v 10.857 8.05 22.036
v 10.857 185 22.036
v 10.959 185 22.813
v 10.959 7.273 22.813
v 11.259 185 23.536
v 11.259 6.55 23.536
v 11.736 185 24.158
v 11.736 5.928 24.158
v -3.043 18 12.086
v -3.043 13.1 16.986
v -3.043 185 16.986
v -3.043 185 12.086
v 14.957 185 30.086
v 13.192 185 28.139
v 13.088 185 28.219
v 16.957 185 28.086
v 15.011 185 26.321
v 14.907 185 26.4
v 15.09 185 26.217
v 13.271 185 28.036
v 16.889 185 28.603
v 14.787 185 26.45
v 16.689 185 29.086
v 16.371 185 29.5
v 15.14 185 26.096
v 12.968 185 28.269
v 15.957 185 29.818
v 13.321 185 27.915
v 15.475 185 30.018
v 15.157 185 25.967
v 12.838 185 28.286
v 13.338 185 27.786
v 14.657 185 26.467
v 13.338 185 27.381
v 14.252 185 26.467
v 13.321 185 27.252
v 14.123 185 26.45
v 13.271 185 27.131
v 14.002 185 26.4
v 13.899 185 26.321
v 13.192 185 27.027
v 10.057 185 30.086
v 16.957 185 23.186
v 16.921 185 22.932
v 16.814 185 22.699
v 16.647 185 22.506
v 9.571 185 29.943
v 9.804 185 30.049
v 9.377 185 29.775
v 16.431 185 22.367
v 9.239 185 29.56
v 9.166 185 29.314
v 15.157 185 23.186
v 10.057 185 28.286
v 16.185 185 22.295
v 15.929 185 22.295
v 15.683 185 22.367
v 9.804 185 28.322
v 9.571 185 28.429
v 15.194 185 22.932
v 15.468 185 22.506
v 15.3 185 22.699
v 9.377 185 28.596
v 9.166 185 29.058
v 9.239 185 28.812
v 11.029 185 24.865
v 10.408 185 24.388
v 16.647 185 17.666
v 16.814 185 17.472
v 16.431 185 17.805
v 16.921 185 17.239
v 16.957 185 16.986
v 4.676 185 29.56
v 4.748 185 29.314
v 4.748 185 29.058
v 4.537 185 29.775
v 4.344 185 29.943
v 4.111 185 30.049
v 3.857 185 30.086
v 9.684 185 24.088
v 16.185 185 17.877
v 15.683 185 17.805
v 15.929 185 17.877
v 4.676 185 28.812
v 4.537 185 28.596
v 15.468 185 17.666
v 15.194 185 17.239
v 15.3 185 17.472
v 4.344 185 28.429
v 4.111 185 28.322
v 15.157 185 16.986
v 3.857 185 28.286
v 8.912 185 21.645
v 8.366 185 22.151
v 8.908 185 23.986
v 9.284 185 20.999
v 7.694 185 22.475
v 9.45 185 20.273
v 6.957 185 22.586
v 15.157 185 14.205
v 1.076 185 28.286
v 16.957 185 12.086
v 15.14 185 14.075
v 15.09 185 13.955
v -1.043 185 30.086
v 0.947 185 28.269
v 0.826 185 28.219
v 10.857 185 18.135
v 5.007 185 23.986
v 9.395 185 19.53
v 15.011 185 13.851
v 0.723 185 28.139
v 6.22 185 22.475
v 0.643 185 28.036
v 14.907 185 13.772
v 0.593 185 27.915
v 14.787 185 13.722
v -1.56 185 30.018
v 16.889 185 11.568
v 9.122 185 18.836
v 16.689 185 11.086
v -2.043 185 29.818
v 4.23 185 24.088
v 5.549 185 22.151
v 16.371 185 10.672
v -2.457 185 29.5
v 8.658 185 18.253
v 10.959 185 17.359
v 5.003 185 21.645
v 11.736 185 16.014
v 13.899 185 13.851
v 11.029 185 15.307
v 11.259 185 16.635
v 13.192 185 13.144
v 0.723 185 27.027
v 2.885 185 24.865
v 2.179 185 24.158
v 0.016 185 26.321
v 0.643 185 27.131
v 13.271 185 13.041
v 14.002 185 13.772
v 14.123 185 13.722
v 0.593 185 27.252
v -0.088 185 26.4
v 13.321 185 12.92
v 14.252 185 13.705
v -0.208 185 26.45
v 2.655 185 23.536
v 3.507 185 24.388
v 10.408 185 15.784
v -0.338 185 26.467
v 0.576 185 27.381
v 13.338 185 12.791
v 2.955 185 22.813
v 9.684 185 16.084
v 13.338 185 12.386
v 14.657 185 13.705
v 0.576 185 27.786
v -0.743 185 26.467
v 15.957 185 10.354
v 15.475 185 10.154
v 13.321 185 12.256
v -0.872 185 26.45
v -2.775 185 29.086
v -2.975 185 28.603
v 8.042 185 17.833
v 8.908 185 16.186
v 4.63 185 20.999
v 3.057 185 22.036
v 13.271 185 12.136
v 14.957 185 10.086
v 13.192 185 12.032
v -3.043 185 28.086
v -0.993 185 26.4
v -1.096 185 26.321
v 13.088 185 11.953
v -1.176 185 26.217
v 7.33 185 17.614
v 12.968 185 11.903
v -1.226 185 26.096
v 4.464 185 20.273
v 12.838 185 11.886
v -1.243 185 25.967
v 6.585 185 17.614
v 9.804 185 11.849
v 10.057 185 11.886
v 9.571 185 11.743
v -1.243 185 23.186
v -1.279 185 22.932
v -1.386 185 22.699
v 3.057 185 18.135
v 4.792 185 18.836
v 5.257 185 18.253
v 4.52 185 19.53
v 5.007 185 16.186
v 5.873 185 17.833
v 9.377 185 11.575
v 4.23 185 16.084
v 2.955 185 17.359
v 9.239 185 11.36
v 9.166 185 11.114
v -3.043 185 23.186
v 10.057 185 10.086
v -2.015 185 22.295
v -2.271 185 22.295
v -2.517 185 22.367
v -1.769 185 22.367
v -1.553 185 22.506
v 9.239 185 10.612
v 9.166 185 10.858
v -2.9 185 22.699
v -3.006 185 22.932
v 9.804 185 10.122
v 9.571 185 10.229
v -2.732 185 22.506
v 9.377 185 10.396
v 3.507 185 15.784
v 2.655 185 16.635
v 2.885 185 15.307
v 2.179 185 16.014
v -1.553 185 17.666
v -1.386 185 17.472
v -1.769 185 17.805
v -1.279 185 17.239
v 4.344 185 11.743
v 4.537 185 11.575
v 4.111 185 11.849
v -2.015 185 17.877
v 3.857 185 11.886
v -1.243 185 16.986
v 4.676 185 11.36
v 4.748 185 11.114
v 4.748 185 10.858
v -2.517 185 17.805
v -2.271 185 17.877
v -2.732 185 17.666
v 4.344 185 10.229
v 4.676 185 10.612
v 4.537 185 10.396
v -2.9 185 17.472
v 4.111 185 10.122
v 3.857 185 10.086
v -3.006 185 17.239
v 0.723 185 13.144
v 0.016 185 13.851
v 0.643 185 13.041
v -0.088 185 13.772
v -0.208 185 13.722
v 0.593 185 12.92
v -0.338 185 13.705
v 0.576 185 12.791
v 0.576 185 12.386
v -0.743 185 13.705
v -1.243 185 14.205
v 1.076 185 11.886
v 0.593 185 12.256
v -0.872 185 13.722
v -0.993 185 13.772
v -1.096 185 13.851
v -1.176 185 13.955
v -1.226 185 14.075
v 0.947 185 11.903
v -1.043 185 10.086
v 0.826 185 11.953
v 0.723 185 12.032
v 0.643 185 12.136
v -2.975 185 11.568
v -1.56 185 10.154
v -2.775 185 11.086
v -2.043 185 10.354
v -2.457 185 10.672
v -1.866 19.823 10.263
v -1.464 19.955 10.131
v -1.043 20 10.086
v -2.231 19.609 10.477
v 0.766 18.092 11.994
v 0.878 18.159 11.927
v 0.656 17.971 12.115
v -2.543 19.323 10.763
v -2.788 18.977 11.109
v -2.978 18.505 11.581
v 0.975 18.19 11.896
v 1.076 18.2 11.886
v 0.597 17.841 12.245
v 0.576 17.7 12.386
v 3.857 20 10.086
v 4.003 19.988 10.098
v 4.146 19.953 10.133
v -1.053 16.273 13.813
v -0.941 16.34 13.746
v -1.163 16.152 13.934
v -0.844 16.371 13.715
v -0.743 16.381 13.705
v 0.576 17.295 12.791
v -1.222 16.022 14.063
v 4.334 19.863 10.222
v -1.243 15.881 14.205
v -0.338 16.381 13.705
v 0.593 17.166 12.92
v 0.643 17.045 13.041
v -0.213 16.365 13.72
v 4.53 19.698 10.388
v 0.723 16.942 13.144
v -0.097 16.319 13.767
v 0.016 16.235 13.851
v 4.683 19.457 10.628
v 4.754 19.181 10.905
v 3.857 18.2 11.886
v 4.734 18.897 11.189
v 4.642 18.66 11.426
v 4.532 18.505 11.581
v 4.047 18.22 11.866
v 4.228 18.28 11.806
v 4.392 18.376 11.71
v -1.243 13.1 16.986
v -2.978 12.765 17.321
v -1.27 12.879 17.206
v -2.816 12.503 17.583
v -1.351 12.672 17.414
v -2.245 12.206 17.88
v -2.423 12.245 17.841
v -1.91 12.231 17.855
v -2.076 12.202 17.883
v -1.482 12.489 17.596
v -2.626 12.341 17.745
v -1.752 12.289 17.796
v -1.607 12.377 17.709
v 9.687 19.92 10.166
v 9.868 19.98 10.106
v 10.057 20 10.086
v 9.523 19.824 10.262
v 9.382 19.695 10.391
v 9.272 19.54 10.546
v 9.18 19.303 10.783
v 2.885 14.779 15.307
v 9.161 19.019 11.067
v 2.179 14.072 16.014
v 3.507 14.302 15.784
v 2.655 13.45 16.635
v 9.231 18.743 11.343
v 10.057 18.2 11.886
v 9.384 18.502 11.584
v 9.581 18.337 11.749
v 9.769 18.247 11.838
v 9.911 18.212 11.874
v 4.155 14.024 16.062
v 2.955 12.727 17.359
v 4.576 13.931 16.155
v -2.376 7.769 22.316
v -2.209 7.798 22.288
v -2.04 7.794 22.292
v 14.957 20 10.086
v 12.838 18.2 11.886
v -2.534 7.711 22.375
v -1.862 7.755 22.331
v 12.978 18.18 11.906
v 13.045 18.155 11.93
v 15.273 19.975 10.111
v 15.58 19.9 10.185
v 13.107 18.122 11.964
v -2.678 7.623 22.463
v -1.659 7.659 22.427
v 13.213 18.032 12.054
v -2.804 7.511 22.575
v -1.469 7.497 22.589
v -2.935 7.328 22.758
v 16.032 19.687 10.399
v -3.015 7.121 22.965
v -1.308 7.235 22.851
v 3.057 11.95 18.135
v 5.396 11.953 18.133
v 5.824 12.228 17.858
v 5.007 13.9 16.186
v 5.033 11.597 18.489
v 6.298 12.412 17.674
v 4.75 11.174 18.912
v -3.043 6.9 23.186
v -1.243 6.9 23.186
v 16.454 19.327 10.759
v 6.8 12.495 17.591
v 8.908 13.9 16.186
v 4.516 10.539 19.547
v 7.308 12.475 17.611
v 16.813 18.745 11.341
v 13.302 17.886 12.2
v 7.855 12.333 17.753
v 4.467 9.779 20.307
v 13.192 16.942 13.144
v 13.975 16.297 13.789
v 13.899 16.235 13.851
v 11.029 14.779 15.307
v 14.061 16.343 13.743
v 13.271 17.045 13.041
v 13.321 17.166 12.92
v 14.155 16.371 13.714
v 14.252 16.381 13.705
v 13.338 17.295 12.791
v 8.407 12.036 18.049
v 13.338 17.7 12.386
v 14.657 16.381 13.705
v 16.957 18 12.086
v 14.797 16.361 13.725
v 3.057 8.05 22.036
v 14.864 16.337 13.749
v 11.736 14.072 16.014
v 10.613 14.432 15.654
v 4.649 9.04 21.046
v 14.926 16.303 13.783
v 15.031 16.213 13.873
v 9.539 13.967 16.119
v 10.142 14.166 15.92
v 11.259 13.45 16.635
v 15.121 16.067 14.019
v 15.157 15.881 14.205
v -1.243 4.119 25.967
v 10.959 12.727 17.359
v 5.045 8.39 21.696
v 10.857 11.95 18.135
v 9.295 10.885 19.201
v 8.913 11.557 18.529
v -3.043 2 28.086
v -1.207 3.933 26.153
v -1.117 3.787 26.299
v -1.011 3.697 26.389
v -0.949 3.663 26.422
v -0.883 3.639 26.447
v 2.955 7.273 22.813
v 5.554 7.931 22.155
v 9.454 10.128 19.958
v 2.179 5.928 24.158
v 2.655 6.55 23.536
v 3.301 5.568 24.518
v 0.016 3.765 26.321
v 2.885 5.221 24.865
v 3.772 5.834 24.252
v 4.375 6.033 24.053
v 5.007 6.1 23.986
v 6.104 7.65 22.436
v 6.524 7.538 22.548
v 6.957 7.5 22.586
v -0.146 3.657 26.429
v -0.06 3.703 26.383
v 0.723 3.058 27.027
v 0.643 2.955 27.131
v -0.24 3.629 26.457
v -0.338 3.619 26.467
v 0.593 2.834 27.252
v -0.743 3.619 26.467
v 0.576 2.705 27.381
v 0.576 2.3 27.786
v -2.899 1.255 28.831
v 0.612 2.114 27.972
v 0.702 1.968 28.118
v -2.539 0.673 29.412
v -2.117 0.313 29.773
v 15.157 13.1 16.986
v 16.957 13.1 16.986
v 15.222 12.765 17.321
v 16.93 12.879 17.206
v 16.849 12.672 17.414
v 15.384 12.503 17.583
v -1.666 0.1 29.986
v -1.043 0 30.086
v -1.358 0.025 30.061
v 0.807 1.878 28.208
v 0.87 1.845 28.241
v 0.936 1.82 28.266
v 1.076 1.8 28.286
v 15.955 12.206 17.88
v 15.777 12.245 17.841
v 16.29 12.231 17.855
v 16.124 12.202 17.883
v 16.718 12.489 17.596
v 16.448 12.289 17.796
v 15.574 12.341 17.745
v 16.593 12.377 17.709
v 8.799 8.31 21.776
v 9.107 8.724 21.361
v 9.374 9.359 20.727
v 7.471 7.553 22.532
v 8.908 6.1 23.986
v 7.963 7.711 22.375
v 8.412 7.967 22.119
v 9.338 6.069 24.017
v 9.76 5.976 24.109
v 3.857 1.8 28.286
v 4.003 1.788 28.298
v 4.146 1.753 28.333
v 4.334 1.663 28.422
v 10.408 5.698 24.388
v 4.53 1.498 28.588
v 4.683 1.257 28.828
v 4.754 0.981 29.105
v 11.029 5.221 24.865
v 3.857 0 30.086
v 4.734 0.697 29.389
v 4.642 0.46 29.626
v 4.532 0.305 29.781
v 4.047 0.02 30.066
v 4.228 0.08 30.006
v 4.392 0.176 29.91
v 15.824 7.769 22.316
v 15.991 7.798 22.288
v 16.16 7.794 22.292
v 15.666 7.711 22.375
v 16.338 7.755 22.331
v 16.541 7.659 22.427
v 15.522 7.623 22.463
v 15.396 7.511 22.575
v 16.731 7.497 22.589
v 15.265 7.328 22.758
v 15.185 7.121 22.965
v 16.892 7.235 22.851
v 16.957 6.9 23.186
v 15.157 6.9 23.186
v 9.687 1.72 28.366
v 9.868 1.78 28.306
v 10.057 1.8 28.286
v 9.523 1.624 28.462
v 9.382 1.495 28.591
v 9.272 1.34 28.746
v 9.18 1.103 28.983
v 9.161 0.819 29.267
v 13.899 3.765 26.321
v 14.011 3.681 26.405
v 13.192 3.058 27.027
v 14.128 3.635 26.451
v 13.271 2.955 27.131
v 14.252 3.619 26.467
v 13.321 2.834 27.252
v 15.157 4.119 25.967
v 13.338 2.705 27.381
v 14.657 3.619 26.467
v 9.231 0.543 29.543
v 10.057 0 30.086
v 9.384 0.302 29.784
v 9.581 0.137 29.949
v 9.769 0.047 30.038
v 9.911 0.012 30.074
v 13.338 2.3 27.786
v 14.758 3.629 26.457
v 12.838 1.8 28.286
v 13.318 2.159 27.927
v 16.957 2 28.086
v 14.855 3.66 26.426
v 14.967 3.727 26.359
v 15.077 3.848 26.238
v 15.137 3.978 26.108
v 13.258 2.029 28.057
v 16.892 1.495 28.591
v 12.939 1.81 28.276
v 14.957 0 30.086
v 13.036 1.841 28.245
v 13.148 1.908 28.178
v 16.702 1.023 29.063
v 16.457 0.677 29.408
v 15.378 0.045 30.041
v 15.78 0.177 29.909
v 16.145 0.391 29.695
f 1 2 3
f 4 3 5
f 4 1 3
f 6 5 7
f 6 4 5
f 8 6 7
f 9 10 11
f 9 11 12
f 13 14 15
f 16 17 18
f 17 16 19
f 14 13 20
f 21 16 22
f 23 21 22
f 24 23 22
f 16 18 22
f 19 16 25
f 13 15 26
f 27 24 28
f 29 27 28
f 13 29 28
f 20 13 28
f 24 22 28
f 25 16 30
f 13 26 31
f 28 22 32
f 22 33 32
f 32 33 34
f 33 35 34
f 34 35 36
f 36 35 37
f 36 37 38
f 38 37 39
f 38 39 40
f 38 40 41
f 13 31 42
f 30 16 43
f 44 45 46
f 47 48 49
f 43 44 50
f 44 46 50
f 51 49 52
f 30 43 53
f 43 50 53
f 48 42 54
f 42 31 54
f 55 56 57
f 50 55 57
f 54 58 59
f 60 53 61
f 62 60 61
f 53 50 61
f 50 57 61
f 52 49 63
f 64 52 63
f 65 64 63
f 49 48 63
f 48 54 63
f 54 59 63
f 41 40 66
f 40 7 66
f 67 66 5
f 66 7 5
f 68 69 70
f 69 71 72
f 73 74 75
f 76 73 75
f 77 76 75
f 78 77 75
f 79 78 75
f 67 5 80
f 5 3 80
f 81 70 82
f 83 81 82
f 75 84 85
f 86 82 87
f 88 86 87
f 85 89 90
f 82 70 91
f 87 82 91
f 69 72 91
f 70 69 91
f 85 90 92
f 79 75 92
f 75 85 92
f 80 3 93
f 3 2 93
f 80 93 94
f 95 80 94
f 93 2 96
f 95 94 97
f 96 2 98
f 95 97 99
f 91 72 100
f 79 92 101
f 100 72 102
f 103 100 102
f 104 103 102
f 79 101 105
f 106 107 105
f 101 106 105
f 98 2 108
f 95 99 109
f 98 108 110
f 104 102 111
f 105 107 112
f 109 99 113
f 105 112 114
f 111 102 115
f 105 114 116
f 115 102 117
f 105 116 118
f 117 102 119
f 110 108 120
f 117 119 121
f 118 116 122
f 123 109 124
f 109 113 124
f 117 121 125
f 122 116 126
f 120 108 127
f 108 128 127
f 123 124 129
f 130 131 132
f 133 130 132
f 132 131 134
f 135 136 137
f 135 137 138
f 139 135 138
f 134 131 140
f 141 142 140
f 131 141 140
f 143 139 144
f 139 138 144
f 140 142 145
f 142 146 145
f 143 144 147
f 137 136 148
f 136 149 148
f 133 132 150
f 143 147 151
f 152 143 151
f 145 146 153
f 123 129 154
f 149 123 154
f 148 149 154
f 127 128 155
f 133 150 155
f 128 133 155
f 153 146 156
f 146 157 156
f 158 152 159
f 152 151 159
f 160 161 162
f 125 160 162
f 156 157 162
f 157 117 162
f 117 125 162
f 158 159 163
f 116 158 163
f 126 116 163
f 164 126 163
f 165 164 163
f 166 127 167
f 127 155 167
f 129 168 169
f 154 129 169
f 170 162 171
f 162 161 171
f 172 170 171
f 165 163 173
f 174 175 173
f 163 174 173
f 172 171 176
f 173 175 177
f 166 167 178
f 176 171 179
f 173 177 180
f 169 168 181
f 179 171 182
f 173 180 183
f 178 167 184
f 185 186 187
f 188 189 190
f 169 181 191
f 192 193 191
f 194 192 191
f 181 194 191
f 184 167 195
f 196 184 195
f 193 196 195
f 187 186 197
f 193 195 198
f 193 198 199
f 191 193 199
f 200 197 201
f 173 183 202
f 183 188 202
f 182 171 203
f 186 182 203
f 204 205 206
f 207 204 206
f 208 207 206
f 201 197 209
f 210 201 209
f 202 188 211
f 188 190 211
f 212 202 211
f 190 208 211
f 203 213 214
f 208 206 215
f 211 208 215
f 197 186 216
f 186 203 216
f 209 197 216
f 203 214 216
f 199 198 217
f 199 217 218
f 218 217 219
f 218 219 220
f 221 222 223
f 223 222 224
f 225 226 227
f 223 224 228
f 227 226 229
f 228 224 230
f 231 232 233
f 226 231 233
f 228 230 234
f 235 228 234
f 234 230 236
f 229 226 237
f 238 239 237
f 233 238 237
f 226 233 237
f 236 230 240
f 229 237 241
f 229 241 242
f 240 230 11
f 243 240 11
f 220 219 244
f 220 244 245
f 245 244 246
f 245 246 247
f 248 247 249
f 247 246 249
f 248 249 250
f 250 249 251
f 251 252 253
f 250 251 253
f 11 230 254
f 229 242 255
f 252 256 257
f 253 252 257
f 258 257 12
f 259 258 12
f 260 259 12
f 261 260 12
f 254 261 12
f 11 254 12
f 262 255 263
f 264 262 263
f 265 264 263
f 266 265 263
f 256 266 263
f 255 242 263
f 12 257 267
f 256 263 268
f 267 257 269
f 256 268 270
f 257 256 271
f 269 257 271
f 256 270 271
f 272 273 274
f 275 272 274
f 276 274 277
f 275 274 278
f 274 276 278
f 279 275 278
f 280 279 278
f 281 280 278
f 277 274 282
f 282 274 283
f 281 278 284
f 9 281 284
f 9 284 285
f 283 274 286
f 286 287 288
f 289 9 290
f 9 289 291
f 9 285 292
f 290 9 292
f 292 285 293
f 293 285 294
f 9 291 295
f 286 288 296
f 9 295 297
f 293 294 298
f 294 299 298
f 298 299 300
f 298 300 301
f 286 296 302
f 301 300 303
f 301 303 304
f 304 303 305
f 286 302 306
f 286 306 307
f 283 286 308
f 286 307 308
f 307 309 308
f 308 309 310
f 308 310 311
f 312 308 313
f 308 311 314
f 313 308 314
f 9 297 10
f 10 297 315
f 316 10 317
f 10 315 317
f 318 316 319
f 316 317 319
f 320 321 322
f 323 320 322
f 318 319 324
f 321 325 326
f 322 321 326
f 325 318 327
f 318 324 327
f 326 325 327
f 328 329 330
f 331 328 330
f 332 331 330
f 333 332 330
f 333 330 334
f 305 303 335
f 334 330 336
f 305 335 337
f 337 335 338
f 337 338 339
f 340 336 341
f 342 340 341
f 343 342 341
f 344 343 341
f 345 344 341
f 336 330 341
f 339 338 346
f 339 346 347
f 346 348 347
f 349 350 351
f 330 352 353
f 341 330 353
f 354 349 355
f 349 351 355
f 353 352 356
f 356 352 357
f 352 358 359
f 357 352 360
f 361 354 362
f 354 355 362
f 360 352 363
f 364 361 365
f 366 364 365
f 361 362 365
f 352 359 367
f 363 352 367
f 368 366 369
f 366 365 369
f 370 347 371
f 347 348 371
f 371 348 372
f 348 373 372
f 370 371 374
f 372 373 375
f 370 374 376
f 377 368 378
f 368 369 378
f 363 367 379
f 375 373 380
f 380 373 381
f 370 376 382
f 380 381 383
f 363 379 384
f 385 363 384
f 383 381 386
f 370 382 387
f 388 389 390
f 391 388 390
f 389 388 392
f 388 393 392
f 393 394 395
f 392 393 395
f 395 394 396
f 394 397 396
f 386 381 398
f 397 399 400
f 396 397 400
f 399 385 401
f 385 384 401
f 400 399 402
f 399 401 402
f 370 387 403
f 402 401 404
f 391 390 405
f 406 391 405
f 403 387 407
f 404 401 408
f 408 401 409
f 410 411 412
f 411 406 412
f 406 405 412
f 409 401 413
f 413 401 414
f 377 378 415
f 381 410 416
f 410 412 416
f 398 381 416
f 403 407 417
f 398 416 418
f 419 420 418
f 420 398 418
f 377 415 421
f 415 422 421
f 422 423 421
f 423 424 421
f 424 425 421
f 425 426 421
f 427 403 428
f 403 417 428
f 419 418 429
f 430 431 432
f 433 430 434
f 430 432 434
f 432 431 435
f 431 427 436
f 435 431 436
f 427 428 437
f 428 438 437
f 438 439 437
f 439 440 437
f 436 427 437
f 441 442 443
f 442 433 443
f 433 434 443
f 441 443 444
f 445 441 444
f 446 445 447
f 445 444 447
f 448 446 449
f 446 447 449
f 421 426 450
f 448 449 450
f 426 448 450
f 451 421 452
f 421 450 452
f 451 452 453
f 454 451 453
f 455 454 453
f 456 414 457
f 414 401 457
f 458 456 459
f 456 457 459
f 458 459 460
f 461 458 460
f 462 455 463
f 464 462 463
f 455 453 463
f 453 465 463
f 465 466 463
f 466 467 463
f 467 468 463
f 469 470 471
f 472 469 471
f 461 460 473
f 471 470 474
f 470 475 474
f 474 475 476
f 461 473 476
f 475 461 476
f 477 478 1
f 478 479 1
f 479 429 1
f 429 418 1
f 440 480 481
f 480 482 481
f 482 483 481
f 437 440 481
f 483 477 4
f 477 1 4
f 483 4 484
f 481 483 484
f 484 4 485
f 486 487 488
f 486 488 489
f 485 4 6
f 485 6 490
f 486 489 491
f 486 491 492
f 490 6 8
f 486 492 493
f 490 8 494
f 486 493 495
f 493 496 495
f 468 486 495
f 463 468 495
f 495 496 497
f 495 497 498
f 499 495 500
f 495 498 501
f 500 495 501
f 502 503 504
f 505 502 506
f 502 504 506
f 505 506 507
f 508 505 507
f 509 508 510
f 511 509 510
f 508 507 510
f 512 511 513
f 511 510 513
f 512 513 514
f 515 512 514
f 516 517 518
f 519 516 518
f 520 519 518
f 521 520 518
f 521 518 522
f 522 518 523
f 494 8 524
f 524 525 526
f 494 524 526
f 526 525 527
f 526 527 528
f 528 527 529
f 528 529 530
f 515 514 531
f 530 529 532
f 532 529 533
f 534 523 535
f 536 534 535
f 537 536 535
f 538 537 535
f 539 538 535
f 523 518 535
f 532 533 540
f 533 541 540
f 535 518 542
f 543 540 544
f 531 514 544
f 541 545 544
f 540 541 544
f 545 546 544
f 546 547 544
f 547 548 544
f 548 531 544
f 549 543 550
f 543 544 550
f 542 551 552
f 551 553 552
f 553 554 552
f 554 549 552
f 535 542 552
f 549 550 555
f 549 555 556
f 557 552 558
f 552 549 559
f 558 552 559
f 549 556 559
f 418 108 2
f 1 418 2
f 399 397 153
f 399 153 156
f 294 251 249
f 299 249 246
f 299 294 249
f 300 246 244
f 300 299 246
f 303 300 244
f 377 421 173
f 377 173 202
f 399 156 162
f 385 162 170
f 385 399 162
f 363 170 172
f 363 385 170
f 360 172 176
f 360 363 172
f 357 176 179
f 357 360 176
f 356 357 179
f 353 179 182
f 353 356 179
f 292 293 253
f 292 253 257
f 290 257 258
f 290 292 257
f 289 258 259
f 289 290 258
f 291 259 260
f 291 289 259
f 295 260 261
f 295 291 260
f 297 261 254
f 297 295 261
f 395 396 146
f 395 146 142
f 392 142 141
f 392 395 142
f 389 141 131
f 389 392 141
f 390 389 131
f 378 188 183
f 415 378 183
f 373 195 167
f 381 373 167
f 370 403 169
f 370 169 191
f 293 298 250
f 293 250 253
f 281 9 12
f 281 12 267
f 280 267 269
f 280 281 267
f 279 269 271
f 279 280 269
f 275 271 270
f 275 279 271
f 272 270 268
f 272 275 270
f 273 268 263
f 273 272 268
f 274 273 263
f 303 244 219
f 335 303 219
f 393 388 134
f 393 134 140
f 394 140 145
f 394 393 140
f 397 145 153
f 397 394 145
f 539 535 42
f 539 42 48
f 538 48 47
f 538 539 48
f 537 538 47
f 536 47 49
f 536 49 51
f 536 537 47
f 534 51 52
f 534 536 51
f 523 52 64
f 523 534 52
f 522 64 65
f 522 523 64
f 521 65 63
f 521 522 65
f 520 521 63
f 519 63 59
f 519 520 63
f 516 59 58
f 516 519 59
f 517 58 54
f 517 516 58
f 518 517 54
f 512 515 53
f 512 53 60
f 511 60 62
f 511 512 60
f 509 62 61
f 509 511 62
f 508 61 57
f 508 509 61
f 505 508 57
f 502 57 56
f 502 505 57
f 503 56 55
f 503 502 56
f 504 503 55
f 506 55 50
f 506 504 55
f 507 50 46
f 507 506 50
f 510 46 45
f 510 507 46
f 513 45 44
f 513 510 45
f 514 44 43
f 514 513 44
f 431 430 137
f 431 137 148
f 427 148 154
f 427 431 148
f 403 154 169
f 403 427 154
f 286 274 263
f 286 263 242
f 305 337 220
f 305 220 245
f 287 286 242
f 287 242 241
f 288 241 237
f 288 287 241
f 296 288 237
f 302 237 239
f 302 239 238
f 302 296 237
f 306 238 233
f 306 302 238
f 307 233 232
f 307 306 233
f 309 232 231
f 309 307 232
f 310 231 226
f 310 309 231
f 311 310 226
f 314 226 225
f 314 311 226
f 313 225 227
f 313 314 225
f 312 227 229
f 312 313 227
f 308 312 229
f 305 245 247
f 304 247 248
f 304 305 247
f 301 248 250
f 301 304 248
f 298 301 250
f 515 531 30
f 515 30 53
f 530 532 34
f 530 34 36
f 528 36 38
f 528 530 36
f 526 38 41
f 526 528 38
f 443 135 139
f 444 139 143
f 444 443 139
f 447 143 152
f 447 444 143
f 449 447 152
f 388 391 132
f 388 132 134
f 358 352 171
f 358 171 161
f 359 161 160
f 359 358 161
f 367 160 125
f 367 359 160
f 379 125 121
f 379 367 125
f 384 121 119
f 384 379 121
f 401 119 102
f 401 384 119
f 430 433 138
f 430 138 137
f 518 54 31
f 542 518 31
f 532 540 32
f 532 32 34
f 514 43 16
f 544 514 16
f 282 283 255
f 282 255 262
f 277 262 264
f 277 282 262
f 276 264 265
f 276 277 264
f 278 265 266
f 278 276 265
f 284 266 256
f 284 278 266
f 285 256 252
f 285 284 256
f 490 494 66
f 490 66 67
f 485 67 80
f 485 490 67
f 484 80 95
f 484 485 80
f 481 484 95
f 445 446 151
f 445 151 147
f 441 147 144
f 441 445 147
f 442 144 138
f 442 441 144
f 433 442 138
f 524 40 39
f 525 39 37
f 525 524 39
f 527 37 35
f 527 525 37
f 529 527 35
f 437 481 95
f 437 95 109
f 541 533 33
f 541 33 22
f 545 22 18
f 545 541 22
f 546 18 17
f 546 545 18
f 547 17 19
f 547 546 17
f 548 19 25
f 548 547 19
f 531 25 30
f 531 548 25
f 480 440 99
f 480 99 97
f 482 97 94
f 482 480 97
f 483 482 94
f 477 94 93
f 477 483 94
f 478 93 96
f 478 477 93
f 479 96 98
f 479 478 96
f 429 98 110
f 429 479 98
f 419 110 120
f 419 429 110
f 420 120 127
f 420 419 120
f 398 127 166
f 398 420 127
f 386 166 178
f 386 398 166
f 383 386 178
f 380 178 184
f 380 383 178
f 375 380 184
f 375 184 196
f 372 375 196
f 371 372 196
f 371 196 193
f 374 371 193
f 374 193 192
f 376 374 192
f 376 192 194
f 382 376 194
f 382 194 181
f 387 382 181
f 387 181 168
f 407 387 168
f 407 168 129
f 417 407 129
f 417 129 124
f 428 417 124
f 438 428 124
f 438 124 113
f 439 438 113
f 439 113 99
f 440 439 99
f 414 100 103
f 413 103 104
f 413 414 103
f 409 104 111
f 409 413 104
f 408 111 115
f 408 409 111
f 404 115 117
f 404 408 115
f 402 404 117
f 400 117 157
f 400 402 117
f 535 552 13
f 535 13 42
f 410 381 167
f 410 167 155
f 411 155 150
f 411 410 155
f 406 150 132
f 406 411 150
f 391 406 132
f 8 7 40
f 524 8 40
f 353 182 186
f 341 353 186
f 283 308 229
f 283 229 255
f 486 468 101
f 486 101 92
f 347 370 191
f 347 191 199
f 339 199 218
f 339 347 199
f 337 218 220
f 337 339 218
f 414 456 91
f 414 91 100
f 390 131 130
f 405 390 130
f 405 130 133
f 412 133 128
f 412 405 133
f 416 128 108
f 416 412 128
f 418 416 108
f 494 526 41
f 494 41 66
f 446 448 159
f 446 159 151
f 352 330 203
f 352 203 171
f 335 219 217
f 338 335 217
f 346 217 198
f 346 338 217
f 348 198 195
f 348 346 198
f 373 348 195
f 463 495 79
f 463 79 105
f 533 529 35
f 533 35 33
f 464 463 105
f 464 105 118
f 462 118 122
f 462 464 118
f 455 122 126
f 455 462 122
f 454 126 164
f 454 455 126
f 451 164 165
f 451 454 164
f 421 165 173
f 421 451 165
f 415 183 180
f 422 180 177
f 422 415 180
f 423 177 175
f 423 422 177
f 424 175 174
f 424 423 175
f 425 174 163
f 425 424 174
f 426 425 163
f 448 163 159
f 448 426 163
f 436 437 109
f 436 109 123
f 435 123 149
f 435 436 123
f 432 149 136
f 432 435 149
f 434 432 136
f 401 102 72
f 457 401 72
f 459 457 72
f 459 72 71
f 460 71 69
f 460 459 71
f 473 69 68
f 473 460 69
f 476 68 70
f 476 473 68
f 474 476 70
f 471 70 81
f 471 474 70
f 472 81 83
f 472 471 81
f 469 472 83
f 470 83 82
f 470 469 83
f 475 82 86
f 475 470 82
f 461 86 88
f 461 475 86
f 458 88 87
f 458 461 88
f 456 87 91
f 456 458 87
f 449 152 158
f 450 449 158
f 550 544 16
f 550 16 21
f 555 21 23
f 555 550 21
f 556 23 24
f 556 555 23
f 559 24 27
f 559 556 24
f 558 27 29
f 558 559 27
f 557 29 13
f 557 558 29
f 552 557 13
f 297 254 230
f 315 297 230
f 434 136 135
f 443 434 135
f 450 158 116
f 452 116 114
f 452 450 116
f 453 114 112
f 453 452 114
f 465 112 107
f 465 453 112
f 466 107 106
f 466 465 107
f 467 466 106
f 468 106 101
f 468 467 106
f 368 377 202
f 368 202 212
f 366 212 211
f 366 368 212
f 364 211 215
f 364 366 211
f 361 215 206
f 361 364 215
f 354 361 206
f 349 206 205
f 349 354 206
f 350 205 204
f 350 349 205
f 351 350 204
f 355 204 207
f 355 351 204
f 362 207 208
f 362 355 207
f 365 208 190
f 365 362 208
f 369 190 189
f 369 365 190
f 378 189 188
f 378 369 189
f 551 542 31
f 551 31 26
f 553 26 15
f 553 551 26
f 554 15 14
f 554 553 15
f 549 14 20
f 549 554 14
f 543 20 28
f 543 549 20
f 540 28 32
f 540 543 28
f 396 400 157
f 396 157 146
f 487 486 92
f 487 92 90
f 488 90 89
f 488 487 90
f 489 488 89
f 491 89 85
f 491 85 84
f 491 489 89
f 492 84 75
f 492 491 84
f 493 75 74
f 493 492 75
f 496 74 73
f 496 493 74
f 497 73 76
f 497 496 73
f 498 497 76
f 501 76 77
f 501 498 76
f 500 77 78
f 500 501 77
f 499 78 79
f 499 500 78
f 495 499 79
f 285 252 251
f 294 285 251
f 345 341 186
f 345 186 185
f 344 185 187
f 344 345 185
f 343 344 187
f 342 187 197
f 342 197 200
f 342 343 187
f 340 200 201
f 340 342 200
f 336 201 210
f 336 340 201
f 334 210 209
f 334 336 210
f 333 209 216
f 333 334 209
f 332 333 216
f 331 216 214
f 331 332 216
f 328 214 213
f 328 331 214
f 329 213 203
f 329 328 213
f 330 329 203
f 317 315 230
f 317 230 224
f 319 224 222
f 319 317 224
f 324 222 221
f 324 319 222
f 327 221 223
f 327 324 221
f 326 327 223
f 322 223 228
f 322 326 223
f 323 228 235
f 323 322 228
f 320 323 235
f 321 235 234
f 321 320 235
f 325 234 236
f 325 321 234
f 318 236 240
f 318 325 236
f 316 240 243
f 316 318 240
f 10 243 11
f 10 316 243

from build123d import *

# Parameters (mm, degrees)
SKETCH_1_R          = 2.5
EXTRUDE_1_DEPTH     = 185
CUT_EXTRUDE_2_DEPTH = 189.494453685


with BuildPart() as part:
    # 草图1 → 凸台-拉伸1 (new body)
    with BuildSketch(Plane(origin=(0, 0, 0), x_dir=(1, 0, 0), z_dir=(0, 1, 0))):
        with BuildLine():
            Line((-1.042752475, -10.085861632), (3.857247525, -10.085861632))
            ThreePointArc((3.857247525, -10.085861632), (4.757247525, -10.985861632), (3.857247525, -11.885861632))
            Line((3.857247525, -11.885861632), (1.076161722, -11.885861632))
            ThreePointArc((1.076161722, -11.885861632), (0.722608332, -12.032308241), (0.576161722, -12.385861632))
            Line((0.576161722, -12.385861632), (0.576161722, -12.790788968))
            ThreePointArc((0.576161722, -12.790788968), (0.614221956, -12.982130685), (0.722608332, -13.144342359))
            Line((0.722608332, -13.144342359), (2.885447948, -15.307181975))
            ThreePointArc((2.885447948, -15.307181975), (3.858717994, -15.957500229), (5.006768291, -16.185861632))
            Line((5.006768291, -16.185861632), (8.907726758, -16.185861632))
            ThreePointArc((8.907726758, -16.185861632), (10.055777055, -15.957500229), (11.029047102, -15.307181975))
            Line((11.029047102, -15.307181975), (13.191886718, -13.144342359))
            ThreePointArc((13.191886718, -13.144342359), (13.300273094, -12.982130685), (13.338333327, -12.790788968))
            Line((13.338333327, -12.790788968), (13.338333327, -12.385861632))
            ThreePointArc((13.338333327, -12.385861632), (13.191886718, -12.032308241), (12.838333327, -11.885861632))
            Line((12.838333327, -11.885861632), (10.057247525, -11.885861632))
            ThreePointArc((10.057247525, -11.885861632), (9.157247525, -10.985861632), (10.057247525, -10.085861632))
            Line((10.057247525, -10.085861632), (14.957247525, -10.085861632))
            ThreePointArc((14.957247525, -10.085861632), (16.371461087, -10.671648069), (16.957247525, -12.085861632))
            Line((16.957247525, -12.085861632), (16.957247525, -16.985861632))
            ThreePointArc((16.957247525, -16.985861632), (16.057247525, -17.885861632), (15.157247525, -16.985861632))
            Line((15.157247525, -16.985861632), (15.157247525, -14.204775829))
            ThreePointArc((15.157247525, -14.204775829), (15.010800915, -13.851222438), (14.657247525, -13.704775829))
            Line((14.657247525, -13.704775829), (14.252320188, -13.704775829))
            ThreePointArc((14.252320188, -13.704775829), (14.060978472, -13.742836063), (13.898766797, -13.851222438))
            Line((13.898766797, -13.851222438), (11.735927181, -16.014062054))
            ThreePointArc((11.735927181, -16.014062054), (11.085608927, -16.987332101), (10.857247525, -18.135382398))
            Line((10.857247525, -18.135382398), (10.857247525, -22.036340865))
            ThreePointArc((10.857247525, -22.036340865), (11.085608927, -23.184391162), (11.735927181, -24.157661209))
            Line((11.735927181, -24.157661209), (13.898766797, -26.320500825))
            ThreePointArc((13.898766797, -26.320500825), (14.060978472, -26.4288872), (14.252320188, -26.466947434))
            Line((14.252320188, -26.466947434), (14.657247525, -26.466947434))
            ThreePointArc((14.657247525, -26.466947434), (15.010800915, -26.320500825), (15.157247525, -25.966947434))
            Line((15.157247525, -25.966947434), (15.157247525, -23.185861632))
            ThreePointArc((15.157247525, -23.185861632), (16.057247525, -22.285861632), (16.957247525, -23.185861632))
            Line((16.957247525, -23.185861632), (16.957247525, -28.085861632))
            ThreePointArc((16.957247525, -28.085861632), (16.371461087, -29.500075194), (14.957247525, -30.085861632))
            Line((14.957247525, -30.085861632), (10.057247525, -30.085861632))
            ThreePointArc((10.057247525, -30.085861632), (9.157247525, -29.185861632), (10.057247525, -28.285861632))
            Line((10.057247525, -28.285861632), (12.838333327, -28.285861632))
            ThreePointArc((12.838333327, -28.285861632), (13.191886718, -28.139415022), (13.338333327, -27.785861632))
            Line((13.338333327, -27.785861632), (13.338333327, -27.380934295))
            ThreePointArc((13.338333327, -27.380934295), (13.300273094, -27.189592579), (13.191886718, -27.027380904))
            Line((13.191886718, -27.027380904), (11.029047102, -24.864541288))
            ThreePointArc((11.029047102, -24.864541288), (10.055777055, -24.214223034), (8.907726758, -23.985861632))
            Line((8.907726758, -23.985861632), (5.006768291, -23.985861632))
            ThreePointArc((5.006768291, -23.985861632), (3.858717994, -24.214223034), (2.885447948, -24.864541288))
            Line((2.885447948, -24.864541288), (0.722608332, -27.027380904))
            ThreePointArc((0.722608332, -27.027380904), (0.614221956, -27.189592579), (0.576161722, -27.380934295))
            Line((0.576161722, -27.380934295), (0.576161722, -27.785861632))
            ThreePointArc((0.576161722, -27.785861632), (0.722608332, -28.139415022), (1.076161722, -28.285861632))
            Line((1.076161722, -28.285861632), (3.857247525, -28.285861632))
            ThreePointArc((3.857247525, -28.285861632), (4.757247525, -29.185861632), (3.857247525, -30.085861632))
            Line((3.857247525, -30.085861632), (-1.042752475, -30.085861632))
            ThreePointArc((-1.042752475, -30.085861632), (-2.456966038, -29.500075194), (-3.042752475, -28.085861632))
            Line((-3.042752475, -28.085861632), (-3.042752475, -23.185861632))
            ThreePointArc((-3.042752475, -23.185861632), (-2.142752475, -22.285861632), (-1.242752475, -23.185861632))
            Line((-1.242752475, -23.185861632), (-1.242752475, -25.966947434))
            ThreePointArc((-1.242752475, -25.966947434), (-1.096305866, -26.320500825), (-0.742752475, -26.466947434))
            Line((-0.742752475, -26.466947434), (-0.337825138, -26.466947434))
            ThreePointArc((-0.337825138, -26.466947434), (-0.146483422, -26.4288872), (0.015728252, -26.320500825))
            Line((0.015728252, -26.320500825), (2.178567868, -24.157661209))
            ThreePointArc((2.178567868, -24.157661209), (2.828886122, -23.184391162), (3.057247525, -22.036340865))
            Line((3.057247525, -22.036340865), (3.057247525, -18.135382398))
            ThreePointArc((3.057247525, -18.135382398), (2.828886122, -16.987332101), (2.178567868, -16.014062054))
            Line((2.178567868, -16.014062054), (0.015728252, -13.851222438))
            ThreePointArc((0.015728252, -13.851222438), (-0.146483422, -13.742836063), (-0.337825138, -13.704775829))
            Line((-0.337825138, -13.704775829), (-0.742752475, -13.704775829))
            ThreePointArc((-0.742752475, -13.704775829), (-1.096305866, -13.851222438), (-1.242752475, -14.204775829))
            Line((-1.242752475, -14.204775829), (-1.242752475, -16.985861632))
            ThreePointArc((-1.242752475, -16.985861632), (-2.142752475, -17.885861632), (-3.042752475, -16.985861632))
            Line((-3.042752475, -16.985861632), (-3.042752475, -12.085861632))
            ThreePointArc((-3.042752475, -12.085861632), (-2.456966038, -10.671648069), (-1.042752475, -10.085861632))
        make_face()
        with Locations(Location((6.957247525, -20.085861632, 0), (0, 0, 270))):
            Circle(SKETCH_1_R, mode=Mode.SUBTRACT)
    extrude(amount=EXTRUDE_1_DEPTH)

    # 草图3 → 切除-拉伸2 (cut, through all)
    with BuildSketch(Plane(origin=(16.957247525, 0, 0), x_dir=(0, 0, -1), z_dir=(1, 0, 0))):
        Polygon((-30.085861632, 0), (-10.085861632, 0), (-10.085861632, 20), align=None)
    extrude(amount=-CUT_EXTRUDE_2_DEPTH, mode=Mode.SUBTRACT)


solid = part.part
